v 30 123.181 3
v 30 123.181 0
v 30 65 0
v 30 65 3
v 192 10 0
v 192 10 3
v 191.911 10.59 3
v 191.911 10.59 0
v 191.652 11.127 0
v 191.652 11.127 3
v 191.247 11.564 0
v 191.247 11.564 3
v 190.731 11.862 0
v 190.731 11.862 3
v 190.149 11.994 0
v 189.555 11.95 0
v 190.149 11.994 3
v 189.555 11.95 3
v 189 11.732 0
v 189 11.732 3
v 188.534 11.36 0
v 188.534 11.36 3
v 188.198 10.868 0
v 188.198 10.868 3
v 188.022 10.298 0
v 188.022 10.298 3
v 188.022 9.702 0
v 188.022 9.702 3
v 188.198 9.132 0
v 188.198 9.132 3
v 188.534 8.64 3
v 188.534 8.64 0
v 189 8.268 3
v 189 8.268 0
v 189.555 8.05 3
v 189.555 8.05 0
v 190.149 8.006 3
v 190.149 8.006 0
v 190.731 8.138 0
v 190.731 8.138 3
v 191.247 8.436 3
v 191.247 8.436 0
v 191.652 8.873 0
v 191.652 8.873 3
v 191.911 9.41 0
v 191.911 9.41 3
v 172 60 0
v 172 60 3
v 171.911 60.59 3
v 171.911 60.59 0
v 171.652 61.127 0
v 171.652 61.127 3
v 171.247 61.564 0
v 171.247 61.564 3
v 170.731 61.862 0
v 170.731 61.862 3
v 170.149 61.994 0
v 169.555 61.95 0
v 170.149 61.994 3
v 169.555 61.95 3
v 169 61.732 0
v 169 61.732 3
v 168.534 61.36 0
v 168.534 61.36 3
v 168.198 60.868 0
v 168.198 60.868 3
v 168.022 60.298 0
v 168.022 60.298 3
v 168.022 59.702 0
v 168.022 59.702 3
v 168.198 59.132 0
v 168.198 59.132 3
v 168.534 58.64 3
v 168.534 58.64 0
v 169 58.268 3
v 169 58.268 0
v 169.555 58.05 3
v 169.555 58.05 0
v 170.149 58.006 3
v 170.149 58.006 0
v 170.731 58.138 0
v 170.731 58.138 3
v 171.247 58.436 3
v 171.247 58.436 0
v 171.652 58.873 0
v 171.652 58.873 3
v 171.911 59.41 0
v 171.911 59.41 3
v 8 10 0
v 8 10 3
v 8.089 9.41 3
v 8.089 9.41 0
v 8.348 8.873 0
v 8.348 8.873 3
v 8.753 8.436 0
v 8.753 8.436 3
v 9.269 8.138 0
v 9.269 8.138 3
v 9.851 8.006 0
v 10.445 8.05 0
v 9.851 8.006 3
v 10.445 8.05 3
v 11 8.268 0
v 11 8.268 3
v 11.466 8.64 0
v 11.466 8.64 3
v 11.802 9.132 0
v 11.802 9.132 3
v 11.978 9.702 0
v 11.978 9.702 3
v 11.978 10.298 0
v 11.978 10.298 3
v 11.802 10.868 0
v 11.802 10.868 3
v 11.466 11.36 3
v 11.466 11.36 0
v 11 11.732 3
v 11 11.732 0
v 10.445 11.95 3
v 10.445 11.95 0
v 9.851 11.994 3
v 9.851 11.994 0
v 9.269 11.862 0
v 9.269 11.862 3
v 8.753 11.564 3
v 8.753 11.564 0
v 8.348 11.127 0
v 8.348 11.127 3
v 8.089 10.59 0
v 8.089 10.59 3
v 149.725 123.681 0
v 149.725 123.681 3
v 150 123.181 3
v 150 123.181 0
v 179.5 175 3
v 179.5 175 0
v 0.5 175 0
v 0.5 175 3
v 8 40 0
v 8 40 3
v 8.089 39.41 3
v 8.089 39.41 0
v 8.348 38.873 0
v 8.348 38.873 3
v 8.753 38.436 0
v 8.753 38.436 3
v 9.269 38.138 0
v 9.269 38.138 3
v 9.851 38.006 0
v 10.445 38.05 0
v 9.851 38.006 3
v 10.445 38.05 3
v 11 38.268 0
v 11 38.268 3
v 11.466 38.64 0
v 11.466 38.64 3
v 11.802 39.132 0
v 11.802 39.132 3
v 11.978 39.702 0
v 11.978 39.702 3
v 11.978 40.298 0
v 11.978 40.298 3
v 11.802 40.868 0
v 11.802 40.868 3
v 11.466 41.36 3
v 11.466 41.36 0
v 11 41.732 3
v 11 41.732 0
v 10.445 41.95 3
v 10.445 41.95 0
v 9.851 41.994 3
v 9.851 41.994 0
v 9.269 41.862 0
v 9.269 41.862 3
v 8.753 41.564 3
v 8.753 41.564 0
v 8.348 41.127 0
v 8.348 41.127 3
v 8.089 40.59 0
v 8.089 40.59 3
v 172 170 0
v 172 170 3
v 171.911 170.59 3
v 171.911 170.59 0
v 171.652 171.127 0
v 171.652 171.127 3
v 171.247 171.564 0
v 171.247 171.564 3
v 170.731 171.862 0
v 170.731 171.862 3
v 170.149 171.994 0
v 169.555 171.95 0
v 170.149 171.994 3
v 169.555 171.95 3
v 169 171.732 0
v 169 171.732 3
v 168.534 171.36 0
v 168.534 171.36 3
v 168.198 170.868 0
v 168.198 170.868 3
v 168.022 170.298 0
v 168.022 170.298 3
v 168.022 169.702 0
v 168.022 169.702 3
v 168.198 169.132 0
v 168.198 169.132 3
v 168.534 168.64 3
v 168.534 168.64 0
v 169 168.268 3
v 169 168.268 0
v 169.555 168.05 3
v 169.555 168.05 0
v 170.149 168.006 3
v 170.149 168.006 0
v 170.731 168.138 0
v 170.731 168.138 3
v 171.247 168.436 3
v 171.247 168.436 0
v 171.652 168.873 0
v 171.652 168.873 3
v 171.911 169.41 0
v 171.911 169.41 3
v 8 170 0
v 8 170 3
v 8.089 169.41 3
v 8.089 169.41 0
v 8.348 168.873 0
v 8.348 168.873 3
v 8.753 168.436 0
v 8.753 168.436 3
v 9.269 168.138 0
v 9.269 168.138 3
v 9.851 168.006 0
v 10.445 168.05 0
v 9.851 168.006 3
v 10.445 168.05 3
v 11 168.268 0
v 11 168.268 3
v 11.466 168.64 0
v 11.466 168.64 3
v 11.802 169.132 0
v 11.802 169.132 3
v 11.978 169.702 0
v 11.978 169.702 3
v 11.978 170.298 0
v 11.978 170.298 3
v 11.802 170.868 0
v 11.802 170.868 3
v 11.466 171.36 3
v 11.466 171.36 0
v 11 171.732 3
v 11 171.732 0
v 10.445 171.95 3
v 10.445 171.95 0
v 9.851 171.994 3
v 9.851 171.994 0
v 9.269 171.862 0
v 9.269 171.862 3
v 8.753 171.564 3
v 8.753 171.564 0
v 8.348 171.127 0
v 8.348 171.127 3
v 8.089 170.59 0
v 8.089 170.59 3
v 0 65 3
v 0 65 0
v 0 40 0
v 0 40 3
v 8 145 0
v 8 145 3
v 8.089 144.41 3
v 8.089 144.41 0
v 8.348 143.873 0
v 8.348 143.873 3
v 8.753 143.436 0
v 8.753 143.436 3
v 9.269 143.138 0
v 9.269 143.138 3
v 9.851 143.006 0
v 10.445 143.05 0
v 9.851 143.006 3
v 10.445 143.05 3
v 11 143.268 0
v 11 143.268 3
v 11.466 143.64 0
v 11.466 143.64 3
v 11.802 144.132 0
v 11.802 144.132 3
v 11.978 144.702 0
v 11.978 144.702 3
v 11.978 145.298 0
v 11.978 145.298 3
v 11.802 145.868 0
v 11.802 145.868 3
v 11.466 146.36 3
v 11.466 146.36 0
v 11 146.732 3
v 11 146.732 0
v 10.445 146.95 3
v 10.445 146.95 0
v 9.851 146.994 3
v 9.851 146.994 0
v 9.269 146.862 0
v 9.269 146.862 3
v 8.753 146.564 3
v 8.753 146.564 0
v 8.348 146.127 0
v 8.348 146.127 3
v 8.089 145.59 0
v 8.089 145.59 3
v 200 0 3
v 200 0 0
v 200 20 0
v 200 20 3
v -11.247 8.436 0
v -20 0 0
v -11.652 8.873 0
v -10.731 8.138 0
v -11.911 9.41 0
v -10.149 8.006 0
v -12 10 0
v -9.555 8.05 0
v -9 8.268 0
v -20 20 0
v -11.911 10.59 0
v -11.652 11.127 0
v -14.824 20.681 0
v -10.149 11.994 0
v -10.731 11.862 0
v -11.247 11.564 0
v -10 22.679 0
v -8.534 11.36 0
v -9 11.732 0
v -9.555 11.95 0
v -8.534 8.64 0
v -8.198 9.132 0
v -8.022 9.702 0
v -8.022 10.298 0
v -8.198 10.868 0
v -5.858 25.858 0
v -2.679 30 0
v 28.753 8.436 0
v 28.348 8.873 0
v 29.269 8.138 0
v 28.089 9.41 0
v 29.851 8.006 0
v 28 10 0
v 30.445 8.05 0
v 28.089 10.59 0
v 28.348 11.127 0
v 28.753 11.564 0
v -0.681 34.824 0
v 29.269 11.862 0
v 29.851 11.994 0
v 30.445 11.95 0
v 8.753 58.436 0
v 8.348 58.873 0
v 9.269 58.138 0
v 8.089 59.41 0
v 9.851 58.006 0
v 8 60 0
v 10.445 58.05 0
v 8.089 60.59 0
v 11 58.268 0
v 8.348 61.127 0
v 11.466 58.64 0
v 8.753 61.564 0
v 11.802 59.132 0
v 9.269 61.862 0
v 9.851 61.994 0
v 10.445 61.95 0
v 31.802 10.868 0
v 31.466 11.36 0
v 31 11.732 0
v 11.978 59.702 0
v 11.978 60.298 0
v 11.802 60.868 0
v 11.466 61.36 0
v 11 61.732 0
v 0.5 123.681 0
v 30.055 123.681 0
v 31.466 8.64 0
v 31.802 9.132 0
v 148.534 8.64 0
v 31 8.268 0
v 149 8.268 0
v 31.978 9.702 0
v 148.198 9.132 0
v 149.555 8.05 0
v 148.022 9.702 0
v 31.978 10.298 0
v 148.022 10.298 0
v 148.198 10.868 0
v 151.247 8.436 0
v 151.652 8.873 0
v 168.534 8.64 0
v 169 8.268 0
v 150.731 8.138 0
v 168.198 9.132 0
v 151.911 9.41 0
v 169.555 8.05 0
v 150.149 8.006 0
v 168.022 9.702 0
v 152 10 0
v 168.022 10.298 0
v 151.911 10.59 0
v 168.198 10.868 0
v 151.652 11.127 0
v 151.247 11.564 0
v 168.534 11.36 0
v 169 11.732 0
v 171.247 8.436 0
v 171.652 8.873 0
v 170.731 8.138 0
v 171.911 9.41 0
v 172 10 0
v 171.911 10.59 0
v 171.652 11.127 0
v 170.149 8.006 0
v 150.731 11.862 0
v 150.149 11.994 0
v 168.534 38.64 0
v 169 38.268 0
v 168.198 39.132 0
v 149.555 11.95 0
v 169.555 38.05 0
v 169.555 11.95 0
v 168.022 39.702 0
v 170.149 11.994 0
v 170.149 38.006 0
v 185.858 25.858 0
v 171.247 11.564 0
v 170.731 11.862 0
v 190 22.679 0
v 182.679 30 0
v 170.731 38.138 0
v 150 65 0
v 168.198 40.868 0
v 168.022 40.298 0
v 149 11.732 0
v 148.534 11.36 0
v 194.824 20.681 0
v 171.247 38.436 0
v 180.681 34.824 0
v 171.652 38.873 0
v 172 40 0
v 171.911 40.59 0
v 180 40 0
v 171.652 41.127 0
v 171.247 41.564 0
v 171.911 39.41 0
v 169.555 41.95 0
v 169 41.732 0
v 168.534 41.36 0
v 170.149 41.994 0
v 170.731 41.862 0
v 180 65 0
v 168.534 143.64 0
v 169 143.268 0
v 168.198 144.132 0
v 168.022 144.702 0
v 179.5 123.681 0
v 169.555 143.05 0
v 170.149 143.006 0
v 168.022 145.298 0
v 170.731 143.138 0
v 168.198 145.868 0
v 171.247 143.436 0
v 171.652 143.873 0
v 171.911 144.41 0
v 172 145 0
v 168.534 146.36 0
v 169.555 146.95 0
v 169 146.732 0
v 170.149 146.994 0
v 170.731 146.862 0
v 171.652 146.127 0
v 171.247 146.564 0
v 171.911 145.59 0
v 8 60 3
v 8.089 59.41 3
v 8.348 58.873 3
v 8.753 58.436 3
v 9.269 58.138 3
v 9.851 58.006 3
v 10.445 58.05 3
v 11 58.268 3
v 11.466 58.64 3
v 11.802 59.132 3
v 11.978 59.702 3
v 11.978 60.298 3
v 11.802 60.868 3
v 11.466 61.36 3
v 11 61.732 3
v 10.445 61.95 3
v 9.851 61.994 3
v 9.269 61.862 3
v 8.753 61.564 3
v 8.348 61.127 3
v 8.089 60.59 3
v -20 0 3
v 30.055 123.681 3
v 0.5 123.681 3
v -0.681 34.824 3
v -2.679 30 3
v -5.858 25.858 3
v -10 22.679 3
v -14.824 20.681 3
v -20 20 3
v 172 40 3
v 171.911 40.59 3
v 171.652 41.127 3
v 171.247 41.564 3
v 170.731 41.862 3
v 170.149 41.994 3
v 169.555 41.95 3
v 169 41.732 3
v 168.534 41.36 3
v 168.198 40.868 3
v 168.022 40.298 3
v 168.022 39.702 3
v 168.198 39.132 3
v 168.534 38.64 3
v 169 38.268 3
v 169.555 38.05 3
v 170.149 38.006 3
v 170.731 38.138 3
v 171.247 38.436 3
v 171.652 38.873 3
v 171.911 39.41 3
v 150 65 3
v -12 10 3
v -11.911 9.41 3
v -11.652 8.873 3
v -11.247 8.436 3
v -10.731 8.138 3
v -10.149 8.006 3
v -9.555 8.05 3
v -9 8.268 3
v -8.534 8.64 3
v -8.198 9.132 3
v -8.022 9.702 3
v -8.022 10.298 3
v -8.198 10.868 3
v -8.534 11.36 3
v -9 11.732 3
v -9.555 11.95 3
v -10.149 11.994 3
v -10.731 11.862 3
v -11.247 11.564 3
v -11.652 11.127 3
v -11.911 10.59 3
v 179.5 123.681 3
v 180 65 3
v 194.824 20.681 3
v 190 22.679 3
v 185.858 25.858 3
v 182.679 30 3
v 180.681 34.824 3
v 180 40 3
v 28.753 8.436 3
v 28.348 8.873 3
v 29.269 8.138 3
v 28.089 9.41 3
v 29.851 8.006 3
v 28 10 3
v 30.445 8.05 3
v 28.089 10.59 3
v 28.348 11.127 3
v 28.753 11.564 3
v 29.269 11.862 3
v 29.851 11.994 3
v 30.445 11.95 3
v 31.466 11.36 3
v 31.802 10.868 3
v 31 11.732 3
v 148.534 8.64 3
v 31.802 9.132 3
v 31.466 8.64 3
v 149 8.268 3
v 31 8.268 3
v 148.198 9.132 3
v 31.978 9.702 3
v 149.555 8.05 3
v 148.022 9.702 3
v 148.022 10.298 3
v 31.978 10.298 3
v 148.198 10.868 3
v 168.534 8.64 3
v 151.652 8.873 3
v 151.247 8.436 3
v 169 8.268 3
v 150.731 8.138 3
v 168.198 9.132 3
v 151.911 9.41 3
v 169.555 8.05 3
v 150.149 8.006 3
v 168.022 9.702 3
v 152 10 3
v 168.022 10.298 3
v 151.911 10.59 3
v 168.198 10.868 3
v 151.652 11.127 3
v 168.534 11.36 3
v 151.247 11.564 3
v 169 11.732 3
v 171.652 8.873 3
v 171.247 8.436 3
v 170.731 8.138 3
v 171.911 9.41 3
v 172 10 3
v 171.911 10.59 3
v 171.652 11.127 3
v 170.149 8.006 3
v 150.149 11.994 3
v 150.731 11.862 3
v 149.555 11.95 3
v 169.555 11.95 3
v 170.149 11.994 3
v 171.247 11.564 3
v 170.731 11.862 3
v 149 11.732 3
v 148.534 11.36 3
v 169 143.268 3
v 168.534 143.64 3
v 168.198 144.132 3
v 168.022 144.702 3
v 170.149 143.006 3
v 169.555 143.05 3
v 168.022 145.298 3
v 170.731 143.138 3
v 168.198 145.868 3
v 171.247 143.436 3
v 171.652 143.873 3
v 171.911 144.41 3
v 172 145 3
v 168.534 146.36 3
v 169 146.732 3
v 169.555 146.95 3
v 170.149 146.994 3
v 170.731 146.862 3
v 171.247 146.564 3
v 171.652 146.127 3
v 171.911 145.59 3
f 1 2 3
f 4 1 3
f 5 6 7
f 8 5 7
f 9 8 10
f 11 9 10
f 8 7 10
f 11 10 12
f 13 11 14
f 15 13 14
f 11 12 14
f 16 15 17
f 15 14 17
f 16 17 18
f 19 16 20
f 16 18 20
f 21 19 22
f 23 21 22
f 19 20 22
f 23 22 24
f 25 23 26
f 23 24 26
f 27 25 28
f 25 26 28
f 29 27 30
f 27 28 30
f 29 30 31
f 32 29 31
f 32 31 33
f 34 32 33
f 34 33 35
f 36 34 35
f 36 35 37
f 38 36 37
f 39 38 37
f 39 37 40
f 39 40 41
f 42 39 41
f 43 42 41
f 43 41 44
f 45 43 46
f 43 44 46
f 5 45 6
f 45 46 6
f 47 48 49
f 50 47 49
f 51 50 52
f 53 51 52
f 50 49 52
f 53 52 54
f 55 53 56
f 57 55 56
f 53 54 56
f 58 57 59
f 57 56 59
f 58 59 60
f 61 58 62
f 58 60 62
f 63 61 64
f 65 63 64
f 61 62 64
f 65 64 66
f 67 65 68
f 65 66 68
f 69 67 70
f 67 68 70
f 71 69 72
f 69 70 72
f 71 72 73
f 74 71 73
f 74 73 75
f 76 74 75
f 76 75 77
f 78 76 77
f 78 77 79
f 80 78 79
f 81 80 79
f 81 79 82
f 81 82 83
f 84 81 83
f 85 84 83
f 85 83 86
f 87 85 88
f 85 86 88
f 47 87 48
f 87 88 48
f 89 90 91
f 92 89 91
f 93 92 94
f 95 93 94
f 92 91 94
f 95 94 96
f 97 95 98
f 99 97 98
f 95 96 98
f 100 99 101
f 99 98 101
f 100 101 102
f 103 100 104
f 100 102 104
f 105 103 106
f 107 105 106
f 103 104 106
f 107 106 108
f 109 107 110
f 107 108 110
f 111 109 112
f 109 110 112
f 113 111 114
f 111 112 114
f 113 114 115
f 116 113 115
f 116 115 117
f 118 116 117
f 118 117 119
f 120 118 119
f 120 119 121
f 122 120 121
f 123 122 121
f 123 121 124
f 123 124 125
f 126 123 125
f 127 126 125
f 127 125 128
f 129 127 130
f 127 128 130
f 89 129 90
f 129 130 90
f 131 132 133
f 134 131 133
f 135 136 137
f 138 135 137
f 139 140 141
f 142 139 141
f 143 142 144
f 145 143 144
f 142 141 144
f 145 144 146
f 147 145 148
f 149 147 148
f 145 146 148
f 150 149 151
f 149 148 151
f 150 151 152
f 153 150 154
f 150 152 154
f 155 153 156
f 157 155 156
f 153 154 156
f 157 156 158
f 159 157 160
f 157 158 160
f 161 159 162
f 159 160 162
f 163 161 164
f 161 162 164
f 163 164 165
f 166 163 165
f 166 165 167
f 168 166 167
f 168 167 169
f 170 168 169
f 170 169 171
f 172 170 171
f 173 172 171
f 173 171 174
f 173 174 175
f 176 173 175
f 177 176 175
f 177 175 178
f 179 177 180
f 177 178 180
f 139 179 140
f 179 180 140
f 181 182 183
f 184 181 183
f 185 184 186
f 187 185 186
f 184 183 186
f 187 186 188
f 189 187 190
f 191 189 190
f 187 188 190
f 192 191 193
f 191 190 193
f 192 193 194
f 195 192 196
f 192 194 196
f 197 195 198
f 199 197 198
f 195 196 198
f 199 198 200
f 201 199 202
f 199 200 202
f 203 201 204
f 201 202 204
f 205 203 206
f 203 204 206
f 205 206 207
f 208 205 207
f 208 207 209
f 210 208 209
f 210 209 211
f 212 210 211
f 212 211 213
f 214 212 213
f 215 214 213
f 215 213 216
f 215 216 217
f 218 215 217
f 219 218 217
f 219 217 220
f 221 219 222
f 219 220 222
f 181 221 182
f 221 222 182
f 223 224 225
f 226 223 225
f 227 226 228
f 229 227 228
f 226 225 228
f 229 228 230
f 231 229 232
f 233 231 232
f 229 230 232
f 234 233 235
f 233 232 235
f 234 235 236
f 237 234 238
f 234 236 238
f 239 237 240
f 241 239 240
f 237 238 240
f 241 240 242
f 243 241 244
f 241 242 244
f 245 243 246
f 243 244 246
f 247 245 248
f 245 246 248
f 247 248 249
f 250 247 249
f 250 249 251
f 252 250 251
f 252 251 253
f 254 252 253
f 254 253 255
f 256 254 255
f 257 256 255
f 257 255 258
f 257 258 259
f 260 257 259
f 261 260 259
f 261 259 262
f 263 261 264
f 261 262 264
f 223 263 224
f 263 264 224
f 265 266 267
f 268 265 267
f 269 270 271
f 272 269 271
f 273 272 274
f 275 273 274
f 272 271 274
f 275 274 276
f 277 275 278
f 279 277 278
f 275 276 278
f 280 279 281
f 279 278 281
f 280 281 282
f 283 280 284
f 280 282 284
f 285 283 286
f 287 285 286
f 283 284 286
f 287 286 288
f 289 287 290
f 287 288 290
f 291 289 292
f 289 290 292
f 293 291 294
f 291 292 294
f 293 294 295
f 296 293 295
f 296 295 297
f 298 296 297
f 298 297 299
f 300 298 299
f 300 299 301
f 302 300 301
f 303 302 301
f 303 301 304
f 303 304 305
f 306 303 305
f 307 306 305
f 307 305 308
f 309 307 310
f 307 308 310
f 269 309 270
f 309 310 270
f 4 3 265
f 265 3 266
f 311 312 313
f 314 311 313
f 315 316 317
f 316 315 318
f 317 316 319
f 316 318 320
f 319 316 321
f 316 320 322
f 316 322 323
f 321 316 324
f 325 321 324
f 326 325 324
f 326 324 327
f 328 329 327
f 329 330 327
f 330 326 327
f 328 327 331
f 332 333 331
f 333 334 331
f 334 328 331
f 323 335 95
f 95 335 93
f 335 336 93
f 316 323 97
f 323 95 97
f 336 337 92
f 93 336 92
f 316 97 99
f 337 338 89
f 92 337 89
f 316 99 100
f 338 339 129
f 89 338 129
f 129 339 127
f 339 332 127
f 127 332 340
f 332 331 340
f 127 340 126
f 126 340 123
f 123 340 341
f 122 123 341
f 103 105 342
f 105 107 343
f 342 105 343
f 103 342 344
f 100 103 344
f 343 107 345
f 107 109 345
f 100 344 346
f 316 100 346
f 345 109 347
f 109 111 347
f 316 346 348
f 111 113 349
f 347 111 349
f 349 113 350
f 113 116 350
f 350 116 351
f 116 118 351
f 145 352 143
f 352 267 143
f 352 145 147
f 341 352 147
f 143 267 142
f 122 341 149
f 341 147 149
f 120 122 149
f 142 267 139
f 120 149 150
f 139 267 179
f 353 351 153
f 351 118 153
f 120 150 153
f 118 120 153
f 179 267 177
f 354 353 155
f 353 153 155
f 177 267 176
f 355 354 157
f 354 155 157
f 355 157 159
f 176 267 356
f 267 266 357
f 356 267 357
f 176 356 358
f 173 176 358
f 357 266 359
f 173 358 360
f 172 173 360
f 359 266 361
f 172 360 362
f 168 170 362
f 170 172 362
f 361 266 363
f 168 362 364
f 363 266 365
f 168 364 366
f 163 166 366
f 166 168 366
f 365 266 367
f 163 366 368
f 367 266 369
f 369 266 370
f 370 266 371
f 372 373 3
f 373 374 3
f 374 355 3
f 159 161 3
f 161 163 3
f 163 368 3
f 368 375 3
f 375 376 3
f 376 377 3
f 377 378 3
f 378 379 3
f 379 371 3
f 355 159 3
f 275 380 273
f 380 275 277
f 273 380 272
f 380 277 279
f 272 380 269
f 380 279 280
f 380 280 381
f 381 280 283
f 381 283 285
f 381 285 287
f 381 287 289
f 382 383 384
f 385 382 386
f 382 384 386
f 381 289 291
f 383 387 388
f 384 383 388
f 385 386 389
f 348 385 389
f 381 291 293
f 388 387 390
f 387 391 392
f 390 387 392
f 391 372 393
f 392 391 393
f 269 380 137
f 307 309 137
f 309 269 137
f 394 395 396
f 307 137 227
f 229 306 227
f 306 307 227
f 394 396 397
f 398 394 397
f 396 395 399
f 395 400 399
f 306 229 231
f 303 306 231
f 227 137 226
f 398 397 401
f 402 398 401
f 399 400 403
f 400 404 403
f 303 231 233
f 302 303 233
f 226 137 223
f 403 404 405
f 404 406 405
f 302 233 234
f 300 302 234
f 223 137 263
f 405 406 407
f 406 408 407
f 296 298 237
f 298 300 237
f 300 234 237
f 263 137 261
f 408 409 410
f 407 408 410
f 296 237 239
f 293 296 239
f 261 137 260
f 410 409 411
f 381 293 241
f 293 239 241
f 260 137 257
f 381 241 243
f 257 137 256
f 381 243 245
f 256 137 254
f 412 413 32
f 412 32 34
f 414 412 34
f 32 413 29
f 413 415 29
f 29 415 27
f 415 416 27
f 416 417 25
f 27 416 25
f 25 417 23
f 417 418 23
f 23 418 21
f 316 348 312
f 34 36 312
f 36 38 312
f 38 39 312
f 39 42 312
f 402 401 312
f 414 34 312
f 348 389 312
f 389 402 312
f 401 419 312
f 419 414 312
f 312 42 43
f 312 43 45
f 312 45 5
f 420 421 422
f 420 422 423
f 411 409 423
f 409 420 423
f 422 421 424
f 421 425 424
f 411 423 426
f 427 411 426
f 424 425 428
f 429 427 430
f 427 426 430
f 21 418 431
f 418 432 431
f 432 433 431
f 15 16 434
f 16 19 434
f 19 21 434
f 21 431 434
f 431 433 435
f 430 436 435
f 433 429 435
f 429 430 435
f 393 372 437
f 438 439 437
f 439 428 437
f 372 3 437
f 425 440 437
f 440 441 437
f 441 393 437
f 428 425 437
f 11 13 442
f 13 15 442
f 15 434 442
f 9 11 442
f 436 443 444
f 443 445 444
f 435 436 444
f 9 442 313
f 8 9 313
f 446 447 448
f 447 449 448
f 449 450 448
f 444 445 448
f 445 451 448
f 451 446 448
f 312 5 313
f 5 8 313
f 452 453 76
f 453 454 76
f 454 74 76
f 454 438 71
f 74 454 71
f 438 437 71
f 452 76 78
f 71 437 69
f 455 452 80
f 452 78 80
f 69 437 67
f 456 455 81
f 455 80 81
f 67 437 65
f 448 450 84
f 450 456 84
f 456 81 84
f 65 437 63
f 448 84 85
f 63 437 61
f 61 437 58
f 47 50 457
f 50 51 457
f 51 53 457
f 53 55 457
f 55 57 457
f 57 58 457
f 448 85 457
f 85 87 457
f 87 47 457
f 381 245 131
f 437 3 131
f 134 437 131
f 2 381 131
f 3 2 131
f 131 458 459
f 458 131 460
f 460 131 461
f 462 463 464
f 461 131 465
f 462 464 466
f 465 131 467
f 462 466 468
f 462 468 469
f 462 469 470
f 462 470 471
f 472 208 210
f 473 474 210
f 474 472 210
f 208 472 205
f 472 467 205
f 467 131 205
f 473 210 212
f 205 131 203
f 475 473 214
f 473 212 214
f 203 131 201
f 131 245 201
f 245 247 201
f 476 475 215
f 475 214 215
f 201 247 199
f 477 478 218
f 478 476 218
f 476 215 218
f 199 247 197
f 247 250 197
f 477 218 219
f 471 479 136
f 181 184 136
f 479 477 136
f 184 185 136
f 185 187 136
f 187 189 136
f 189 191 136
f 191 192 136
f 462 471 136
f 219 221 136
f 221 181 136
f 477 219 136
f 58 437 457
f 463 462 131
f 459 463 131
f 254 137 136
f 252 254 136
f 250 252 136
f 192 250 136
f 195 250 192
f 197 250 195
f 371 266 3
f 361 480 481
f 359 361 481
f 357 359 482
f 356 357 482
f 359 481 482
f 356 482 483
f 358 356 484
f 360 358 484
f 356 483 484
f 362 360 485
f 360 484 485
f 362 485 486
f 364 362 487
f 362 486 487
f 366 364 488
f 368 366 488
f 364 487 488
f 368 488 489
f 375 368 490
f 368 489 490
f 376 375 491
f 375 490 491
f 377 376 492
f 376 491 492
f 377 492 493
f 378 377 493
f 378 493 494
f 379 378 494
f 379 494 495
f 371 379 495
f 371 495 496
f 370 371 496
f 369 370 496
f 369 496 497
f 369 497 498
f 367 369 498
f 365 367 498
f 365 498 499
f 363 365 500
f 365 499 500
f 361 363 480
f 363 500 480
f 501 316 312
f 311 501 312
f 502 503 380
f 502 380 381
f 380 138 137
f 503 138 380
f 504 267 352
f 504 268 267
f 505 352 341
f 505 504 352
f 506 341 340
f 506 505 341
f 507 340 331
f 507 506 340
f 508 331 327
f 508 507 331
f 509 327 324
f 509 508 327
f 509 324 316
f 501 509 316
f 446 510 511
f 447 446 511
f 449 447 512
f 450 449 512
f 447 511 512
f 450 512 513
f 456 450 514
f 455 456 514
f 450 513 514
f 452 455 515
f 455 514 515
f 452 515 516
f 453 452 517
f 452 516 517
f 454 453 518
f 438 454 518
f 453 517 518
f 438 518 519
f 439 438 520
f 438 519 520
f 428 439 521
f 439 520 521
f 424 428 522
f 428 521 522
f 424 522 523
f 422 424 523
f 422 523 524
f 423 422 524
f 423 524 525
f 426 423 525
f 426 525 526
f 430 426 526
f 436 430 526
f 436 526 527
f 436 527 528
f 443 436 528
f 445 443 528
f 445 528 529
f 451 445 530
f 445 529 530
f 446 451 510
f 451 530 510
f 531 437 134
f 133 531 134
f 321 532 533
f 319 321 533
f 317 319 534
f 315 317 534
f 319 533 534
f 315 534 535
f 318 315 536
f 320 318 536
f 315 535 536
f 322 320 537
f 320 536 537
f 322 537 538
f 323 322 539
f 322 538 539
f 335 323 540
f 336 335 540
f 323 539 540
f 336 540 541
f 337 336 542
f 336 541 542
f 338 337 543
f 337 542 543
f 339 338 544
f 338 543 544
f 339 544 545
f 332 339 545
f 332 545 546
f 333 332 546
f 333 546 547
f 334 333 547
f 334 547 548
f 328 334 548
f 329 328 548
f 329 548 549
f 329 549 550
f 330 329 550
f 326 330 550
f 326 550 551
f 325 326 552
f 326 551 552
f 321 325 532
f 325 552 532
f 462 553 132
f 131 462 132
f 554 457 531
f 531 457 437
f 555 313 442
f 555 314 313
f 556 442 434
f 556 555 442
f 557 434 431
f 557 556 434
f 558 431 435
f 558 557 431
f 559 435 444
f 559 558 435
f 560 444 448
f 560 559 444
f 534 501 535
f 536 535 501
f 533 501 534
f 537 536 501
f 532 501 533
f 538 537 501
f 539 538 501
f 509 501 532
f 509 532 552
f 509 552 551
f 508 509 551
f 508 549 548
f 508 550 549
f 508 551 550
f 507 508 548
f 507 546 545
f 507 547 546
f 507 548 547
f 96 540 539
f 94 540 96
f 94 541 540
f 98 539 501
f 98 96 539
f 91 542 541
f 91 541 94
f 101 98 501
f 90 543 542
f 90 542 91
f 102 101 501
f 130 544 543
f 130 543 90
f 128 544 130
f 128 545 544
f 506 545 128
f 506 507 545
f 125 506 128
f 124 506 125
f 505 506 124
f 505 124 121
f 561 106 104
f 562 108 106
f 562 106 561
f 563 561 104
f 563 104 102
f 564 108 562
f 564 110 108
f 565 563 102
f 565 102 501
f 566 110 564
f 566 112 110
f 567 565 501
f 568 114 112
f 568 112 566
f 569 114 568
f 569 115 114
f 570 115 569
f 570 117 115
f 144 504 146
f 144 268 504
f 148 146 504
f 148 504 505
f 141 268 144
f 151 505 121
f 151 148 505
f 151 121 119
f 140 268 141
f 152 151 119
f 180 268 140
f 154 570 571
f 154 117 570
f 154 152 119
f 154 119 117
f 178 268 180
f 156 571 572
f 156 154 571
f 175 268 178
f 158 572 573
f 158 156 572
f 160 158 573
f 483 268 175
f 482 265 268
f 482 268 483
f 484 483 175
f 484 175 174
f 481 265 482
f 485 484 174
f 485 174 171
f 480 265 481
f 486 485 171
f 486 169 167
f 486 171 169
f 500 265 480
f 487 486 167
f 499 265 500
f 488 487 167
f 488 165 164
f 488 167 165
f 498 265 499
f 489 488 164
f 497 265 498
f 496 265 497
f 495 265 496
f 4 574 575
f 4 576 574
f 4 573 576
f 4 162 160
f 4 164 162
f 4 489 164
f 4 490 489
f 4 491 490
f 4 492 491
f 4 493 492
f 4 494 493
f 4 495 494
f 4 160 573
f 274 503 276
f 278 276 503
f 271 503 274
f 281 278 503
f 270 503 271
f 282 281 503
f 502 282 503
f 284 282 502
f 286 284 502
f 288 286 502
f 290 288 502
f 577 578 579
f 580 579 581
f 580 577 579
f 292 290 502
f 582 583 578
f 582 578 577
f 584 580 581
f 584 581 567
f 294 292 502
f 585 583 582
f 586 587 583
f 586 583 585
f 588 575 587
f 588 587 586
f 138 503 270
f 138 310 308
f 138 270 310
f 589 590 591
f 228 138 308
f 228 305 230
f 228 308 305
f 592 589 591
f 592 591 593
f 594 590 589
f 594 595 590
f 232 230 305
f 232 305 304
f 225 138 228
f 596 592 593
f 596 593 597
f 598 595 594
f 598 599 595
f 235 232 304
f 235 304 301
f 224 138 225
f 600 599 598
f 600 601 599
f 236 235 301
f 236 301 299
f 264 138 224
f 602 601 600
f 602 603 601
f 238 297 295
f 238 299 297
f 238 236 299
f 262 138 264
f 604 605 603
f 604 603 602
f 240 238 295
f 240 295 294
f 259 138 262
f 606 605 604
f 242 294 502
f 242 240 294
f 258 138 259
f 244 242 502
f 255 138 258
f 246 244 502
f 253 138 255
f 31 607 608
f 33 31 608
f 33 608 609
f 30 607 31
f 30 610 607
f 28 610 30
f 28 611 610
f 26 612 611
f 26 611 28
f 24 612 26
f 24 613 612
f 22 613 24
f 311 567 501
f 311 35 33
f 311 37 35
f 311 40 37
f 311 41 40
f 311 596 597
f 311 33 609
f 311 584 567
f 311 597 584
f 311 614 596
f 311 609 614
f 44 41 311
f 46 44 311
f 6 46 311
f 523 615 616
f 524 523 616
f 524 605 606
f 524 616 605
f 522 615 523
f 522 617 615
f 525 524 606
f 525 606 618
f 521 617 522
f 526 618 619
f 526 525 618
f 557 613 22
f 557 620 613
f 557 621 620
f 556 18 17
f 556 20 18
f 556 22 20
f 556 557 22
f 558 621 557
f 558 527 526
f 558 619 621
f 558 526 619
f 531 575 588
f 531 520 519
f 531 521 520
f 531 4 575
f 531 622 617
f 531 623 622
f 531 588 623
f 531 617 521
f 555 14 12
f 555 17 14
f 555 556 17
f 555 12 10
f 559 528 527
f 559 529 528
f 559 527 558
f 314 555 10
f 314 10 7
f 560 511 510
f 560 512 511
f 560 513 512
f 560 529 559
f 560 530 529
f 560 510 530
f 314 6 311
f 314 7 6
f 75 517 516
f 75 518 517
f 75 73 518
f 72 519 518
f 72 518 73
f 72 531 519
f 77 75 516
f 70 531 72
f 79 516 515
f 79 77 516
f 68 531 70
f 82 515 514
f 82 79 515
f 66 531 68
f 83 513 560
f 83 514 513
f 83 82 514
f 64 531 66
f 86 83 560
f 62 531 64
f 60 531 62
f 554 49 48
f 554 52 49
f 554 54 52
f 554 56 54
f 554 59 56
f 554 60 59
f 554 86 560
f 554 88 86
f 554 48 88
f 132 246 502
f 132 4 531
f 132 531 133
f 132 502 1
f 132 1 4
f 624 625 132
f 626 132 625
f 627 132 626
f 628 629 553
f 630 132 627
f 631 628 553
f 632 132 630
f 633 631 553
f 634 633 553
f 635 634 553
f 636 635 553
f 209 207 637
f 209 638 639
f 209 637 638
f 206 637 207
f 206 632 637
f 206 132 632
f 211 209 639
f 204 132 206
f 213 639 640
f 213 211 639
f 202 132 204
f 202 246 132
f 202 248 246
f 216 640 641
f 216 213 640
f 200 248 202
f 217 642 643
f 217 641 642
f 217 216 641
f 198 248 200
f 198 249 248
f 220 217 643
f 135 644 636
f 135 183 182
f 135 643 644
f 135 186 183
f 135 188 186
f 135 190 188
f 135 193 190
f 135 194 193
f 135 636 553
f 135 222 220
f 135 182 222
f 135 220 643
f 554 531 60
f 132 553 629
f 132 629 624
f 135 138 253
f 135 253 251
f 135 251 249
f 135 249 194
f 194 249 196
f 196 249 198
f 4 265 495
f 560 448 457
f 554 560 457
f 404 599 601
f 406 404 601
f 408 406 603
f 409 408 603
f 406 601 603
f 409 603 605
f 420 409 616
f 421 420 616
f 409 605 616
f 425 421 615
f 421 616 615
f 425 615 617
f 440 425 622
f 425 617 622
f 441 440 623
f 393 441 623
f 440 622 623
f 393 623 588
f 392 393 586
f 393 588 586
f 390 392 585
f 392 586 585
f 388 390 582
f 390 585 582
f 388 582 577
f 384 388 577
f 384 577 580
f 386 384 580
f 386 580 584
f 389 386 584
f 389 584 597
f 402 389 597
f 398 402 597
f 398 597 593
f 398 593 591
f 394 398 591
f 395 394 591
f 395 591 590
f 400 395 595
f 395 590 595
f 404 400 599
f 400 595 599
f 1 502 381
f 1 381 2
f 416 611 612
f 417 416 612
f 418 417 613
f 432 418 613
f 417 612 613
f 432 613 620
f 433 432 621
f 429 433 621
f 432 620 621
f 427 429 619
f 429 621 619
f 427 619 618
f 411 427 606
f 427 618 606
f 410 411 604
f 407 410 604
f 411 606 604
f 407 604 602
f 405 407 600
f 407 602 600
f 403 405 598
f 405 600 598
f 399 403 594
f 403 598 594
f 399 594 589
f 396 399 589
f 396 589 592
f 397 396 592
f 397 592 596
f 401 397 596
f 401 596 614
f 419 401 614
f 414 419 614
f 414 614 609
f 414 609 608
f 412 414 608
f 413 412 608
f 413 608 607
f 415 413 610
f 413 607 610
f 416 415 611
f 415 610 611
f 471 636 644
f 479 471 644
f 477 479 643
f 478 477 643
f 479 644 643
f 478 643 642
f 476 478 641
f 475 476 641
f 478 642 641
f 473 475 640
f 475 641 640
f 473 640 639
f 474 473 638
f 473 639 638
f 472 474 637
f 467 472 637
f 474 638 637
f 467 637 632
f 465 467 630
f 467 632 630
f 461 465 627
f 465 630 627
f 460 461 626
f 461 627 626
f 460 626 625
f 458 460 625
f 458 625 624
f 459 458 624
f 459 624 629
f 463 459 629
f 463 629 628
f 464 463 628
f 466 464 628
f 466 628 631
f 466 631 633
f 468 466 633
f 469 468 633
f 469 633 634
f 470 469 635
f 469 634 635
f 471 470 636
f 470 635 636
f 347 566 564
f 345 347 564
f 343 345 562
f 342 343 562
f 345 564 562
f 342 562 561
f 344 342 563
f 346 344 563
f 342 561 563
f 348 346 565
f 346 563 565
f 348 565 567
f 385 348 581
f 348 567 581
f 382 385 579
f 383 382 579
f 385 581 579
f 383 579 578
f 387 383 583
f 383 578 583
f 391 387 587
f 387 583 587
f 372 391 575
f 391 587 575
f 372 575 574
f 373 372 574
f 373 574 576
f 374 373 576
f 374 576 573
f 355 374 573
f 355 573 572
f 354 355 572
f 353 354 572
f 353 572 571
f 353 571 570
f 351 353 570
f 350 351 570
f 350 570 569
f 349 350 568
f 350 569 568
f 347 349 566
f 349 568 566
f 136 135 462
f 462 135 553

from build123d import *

# Parameters (mm, degrees)
EXTRUDE_1_DEPTH     = 3
FILLET_2_R          = 20
SKETCH_2_R          = 2
CUT_EXTRUDE_1_DEPTH = 3
CUT_EXTRUDE_2_DEPTH = 10


with BuildPart() as part:
    # 草图1 → 凸台-拉伸1 (new body)
    with BuildSketch(Plane.XY):
        Polygon((0, 65), (0, 20), (-20, 20), (-20, 0), (200, 0), (200, 20), (180, 20), (180, 65), (150, 65), (150, 123.180584191), (180, 123.180584191), (180, 175), (0, 175), (0, 123.180584191), (30, 123.180584191), (30, 65), align=None)
    extrude(amount=EXTRUDE_1_DEPTH)

    # 圆角2
    fillet_2_edges = [part.edges().sort_by_distance(p)[0] for p in [
        (0, 20, 1.5),
        (180, 20, 1.5),
    ]]
    fillet(fillet_2_edges, radius=FILLET_2_R - 0.0001)  # a hair under: the kernel refuses the full size

    # 草图2 → 切除-拉伸1 (cut)
    with BuildSketch(Plane.XY.offset(3)):
        with Locations((170, 10)):
            Circle(SKETCH_2_R)
        with Locations((190, 10)):
            Circle(SKETCH_2_R)
        with Locations((170, 40)):
            Circle(SKETCH_2_R)
        with Locations((150, 10)):
            Circle(SKETCH_2_R)
        with Locations(Location((30, 10, 0), (0, 0, 180))):
            Circle(SKETCH_2_R)
        with Locations(Location((10, 40, 0), (0, 0, 180))):
            Circle(SKETCH_2_R)
        with Locations(Location((-10, 10, 0), (0, 0, 180))):
            Circle(SKETCH_2_R)
        with Locations(Location((10, 10, 0), (0, 0, 180))):
            Circle(SKETCH_2_R)
        with Locations((170, 145)):
            Circle(SKETCH_2_R)
        with Locations(Location((10, 145, 0), (0, 0, 180))):
            Circle(SKETCH_2_R)
        with Locations((170, 60)):
            Circle(SKETCH_2_R)
        with Locations(Location((10, 60, 0), (0, 0, 180))):
            Circle(SKETCH_2_R)
        with Locations((170, 170)):
            Circle(SKETCH_2_R)
        with Locations(Location((10, 170, 0), (0, 0, 180))):
            Circle(SKETCH_2_R)
    extrude(amount=-CUT_EXTRUDE_1_DEPTH, mode=Mode.SUBTRACT)

    # 草图4 → 切除-拉伸2 (cut)
    with BuildSketch(Plane.XY.offset(3)):
        Polygon((0.5, 175), (0.5, 123.680584191), (30.055288572, 123.680584191), (30, 123.180584191), (-10.698425682, 117.187764406), (-9.272714691, 179.443811016), (-1.573875339, 179.443811016), align=None)
        Polygon((179.5, 175), (179.5, 123.680584191), (149.725032109, 123.680584191), (150, 123.180584191), (194.189444242, 109.302917778), (194.429656629, 189.306403842), (181.700722274, 189.306403842), align=None)
    extrude(amount=-CUT_EXTRUDE_2_DEPTH, mode=Mode.SUBTRACT)


solid = part.part
